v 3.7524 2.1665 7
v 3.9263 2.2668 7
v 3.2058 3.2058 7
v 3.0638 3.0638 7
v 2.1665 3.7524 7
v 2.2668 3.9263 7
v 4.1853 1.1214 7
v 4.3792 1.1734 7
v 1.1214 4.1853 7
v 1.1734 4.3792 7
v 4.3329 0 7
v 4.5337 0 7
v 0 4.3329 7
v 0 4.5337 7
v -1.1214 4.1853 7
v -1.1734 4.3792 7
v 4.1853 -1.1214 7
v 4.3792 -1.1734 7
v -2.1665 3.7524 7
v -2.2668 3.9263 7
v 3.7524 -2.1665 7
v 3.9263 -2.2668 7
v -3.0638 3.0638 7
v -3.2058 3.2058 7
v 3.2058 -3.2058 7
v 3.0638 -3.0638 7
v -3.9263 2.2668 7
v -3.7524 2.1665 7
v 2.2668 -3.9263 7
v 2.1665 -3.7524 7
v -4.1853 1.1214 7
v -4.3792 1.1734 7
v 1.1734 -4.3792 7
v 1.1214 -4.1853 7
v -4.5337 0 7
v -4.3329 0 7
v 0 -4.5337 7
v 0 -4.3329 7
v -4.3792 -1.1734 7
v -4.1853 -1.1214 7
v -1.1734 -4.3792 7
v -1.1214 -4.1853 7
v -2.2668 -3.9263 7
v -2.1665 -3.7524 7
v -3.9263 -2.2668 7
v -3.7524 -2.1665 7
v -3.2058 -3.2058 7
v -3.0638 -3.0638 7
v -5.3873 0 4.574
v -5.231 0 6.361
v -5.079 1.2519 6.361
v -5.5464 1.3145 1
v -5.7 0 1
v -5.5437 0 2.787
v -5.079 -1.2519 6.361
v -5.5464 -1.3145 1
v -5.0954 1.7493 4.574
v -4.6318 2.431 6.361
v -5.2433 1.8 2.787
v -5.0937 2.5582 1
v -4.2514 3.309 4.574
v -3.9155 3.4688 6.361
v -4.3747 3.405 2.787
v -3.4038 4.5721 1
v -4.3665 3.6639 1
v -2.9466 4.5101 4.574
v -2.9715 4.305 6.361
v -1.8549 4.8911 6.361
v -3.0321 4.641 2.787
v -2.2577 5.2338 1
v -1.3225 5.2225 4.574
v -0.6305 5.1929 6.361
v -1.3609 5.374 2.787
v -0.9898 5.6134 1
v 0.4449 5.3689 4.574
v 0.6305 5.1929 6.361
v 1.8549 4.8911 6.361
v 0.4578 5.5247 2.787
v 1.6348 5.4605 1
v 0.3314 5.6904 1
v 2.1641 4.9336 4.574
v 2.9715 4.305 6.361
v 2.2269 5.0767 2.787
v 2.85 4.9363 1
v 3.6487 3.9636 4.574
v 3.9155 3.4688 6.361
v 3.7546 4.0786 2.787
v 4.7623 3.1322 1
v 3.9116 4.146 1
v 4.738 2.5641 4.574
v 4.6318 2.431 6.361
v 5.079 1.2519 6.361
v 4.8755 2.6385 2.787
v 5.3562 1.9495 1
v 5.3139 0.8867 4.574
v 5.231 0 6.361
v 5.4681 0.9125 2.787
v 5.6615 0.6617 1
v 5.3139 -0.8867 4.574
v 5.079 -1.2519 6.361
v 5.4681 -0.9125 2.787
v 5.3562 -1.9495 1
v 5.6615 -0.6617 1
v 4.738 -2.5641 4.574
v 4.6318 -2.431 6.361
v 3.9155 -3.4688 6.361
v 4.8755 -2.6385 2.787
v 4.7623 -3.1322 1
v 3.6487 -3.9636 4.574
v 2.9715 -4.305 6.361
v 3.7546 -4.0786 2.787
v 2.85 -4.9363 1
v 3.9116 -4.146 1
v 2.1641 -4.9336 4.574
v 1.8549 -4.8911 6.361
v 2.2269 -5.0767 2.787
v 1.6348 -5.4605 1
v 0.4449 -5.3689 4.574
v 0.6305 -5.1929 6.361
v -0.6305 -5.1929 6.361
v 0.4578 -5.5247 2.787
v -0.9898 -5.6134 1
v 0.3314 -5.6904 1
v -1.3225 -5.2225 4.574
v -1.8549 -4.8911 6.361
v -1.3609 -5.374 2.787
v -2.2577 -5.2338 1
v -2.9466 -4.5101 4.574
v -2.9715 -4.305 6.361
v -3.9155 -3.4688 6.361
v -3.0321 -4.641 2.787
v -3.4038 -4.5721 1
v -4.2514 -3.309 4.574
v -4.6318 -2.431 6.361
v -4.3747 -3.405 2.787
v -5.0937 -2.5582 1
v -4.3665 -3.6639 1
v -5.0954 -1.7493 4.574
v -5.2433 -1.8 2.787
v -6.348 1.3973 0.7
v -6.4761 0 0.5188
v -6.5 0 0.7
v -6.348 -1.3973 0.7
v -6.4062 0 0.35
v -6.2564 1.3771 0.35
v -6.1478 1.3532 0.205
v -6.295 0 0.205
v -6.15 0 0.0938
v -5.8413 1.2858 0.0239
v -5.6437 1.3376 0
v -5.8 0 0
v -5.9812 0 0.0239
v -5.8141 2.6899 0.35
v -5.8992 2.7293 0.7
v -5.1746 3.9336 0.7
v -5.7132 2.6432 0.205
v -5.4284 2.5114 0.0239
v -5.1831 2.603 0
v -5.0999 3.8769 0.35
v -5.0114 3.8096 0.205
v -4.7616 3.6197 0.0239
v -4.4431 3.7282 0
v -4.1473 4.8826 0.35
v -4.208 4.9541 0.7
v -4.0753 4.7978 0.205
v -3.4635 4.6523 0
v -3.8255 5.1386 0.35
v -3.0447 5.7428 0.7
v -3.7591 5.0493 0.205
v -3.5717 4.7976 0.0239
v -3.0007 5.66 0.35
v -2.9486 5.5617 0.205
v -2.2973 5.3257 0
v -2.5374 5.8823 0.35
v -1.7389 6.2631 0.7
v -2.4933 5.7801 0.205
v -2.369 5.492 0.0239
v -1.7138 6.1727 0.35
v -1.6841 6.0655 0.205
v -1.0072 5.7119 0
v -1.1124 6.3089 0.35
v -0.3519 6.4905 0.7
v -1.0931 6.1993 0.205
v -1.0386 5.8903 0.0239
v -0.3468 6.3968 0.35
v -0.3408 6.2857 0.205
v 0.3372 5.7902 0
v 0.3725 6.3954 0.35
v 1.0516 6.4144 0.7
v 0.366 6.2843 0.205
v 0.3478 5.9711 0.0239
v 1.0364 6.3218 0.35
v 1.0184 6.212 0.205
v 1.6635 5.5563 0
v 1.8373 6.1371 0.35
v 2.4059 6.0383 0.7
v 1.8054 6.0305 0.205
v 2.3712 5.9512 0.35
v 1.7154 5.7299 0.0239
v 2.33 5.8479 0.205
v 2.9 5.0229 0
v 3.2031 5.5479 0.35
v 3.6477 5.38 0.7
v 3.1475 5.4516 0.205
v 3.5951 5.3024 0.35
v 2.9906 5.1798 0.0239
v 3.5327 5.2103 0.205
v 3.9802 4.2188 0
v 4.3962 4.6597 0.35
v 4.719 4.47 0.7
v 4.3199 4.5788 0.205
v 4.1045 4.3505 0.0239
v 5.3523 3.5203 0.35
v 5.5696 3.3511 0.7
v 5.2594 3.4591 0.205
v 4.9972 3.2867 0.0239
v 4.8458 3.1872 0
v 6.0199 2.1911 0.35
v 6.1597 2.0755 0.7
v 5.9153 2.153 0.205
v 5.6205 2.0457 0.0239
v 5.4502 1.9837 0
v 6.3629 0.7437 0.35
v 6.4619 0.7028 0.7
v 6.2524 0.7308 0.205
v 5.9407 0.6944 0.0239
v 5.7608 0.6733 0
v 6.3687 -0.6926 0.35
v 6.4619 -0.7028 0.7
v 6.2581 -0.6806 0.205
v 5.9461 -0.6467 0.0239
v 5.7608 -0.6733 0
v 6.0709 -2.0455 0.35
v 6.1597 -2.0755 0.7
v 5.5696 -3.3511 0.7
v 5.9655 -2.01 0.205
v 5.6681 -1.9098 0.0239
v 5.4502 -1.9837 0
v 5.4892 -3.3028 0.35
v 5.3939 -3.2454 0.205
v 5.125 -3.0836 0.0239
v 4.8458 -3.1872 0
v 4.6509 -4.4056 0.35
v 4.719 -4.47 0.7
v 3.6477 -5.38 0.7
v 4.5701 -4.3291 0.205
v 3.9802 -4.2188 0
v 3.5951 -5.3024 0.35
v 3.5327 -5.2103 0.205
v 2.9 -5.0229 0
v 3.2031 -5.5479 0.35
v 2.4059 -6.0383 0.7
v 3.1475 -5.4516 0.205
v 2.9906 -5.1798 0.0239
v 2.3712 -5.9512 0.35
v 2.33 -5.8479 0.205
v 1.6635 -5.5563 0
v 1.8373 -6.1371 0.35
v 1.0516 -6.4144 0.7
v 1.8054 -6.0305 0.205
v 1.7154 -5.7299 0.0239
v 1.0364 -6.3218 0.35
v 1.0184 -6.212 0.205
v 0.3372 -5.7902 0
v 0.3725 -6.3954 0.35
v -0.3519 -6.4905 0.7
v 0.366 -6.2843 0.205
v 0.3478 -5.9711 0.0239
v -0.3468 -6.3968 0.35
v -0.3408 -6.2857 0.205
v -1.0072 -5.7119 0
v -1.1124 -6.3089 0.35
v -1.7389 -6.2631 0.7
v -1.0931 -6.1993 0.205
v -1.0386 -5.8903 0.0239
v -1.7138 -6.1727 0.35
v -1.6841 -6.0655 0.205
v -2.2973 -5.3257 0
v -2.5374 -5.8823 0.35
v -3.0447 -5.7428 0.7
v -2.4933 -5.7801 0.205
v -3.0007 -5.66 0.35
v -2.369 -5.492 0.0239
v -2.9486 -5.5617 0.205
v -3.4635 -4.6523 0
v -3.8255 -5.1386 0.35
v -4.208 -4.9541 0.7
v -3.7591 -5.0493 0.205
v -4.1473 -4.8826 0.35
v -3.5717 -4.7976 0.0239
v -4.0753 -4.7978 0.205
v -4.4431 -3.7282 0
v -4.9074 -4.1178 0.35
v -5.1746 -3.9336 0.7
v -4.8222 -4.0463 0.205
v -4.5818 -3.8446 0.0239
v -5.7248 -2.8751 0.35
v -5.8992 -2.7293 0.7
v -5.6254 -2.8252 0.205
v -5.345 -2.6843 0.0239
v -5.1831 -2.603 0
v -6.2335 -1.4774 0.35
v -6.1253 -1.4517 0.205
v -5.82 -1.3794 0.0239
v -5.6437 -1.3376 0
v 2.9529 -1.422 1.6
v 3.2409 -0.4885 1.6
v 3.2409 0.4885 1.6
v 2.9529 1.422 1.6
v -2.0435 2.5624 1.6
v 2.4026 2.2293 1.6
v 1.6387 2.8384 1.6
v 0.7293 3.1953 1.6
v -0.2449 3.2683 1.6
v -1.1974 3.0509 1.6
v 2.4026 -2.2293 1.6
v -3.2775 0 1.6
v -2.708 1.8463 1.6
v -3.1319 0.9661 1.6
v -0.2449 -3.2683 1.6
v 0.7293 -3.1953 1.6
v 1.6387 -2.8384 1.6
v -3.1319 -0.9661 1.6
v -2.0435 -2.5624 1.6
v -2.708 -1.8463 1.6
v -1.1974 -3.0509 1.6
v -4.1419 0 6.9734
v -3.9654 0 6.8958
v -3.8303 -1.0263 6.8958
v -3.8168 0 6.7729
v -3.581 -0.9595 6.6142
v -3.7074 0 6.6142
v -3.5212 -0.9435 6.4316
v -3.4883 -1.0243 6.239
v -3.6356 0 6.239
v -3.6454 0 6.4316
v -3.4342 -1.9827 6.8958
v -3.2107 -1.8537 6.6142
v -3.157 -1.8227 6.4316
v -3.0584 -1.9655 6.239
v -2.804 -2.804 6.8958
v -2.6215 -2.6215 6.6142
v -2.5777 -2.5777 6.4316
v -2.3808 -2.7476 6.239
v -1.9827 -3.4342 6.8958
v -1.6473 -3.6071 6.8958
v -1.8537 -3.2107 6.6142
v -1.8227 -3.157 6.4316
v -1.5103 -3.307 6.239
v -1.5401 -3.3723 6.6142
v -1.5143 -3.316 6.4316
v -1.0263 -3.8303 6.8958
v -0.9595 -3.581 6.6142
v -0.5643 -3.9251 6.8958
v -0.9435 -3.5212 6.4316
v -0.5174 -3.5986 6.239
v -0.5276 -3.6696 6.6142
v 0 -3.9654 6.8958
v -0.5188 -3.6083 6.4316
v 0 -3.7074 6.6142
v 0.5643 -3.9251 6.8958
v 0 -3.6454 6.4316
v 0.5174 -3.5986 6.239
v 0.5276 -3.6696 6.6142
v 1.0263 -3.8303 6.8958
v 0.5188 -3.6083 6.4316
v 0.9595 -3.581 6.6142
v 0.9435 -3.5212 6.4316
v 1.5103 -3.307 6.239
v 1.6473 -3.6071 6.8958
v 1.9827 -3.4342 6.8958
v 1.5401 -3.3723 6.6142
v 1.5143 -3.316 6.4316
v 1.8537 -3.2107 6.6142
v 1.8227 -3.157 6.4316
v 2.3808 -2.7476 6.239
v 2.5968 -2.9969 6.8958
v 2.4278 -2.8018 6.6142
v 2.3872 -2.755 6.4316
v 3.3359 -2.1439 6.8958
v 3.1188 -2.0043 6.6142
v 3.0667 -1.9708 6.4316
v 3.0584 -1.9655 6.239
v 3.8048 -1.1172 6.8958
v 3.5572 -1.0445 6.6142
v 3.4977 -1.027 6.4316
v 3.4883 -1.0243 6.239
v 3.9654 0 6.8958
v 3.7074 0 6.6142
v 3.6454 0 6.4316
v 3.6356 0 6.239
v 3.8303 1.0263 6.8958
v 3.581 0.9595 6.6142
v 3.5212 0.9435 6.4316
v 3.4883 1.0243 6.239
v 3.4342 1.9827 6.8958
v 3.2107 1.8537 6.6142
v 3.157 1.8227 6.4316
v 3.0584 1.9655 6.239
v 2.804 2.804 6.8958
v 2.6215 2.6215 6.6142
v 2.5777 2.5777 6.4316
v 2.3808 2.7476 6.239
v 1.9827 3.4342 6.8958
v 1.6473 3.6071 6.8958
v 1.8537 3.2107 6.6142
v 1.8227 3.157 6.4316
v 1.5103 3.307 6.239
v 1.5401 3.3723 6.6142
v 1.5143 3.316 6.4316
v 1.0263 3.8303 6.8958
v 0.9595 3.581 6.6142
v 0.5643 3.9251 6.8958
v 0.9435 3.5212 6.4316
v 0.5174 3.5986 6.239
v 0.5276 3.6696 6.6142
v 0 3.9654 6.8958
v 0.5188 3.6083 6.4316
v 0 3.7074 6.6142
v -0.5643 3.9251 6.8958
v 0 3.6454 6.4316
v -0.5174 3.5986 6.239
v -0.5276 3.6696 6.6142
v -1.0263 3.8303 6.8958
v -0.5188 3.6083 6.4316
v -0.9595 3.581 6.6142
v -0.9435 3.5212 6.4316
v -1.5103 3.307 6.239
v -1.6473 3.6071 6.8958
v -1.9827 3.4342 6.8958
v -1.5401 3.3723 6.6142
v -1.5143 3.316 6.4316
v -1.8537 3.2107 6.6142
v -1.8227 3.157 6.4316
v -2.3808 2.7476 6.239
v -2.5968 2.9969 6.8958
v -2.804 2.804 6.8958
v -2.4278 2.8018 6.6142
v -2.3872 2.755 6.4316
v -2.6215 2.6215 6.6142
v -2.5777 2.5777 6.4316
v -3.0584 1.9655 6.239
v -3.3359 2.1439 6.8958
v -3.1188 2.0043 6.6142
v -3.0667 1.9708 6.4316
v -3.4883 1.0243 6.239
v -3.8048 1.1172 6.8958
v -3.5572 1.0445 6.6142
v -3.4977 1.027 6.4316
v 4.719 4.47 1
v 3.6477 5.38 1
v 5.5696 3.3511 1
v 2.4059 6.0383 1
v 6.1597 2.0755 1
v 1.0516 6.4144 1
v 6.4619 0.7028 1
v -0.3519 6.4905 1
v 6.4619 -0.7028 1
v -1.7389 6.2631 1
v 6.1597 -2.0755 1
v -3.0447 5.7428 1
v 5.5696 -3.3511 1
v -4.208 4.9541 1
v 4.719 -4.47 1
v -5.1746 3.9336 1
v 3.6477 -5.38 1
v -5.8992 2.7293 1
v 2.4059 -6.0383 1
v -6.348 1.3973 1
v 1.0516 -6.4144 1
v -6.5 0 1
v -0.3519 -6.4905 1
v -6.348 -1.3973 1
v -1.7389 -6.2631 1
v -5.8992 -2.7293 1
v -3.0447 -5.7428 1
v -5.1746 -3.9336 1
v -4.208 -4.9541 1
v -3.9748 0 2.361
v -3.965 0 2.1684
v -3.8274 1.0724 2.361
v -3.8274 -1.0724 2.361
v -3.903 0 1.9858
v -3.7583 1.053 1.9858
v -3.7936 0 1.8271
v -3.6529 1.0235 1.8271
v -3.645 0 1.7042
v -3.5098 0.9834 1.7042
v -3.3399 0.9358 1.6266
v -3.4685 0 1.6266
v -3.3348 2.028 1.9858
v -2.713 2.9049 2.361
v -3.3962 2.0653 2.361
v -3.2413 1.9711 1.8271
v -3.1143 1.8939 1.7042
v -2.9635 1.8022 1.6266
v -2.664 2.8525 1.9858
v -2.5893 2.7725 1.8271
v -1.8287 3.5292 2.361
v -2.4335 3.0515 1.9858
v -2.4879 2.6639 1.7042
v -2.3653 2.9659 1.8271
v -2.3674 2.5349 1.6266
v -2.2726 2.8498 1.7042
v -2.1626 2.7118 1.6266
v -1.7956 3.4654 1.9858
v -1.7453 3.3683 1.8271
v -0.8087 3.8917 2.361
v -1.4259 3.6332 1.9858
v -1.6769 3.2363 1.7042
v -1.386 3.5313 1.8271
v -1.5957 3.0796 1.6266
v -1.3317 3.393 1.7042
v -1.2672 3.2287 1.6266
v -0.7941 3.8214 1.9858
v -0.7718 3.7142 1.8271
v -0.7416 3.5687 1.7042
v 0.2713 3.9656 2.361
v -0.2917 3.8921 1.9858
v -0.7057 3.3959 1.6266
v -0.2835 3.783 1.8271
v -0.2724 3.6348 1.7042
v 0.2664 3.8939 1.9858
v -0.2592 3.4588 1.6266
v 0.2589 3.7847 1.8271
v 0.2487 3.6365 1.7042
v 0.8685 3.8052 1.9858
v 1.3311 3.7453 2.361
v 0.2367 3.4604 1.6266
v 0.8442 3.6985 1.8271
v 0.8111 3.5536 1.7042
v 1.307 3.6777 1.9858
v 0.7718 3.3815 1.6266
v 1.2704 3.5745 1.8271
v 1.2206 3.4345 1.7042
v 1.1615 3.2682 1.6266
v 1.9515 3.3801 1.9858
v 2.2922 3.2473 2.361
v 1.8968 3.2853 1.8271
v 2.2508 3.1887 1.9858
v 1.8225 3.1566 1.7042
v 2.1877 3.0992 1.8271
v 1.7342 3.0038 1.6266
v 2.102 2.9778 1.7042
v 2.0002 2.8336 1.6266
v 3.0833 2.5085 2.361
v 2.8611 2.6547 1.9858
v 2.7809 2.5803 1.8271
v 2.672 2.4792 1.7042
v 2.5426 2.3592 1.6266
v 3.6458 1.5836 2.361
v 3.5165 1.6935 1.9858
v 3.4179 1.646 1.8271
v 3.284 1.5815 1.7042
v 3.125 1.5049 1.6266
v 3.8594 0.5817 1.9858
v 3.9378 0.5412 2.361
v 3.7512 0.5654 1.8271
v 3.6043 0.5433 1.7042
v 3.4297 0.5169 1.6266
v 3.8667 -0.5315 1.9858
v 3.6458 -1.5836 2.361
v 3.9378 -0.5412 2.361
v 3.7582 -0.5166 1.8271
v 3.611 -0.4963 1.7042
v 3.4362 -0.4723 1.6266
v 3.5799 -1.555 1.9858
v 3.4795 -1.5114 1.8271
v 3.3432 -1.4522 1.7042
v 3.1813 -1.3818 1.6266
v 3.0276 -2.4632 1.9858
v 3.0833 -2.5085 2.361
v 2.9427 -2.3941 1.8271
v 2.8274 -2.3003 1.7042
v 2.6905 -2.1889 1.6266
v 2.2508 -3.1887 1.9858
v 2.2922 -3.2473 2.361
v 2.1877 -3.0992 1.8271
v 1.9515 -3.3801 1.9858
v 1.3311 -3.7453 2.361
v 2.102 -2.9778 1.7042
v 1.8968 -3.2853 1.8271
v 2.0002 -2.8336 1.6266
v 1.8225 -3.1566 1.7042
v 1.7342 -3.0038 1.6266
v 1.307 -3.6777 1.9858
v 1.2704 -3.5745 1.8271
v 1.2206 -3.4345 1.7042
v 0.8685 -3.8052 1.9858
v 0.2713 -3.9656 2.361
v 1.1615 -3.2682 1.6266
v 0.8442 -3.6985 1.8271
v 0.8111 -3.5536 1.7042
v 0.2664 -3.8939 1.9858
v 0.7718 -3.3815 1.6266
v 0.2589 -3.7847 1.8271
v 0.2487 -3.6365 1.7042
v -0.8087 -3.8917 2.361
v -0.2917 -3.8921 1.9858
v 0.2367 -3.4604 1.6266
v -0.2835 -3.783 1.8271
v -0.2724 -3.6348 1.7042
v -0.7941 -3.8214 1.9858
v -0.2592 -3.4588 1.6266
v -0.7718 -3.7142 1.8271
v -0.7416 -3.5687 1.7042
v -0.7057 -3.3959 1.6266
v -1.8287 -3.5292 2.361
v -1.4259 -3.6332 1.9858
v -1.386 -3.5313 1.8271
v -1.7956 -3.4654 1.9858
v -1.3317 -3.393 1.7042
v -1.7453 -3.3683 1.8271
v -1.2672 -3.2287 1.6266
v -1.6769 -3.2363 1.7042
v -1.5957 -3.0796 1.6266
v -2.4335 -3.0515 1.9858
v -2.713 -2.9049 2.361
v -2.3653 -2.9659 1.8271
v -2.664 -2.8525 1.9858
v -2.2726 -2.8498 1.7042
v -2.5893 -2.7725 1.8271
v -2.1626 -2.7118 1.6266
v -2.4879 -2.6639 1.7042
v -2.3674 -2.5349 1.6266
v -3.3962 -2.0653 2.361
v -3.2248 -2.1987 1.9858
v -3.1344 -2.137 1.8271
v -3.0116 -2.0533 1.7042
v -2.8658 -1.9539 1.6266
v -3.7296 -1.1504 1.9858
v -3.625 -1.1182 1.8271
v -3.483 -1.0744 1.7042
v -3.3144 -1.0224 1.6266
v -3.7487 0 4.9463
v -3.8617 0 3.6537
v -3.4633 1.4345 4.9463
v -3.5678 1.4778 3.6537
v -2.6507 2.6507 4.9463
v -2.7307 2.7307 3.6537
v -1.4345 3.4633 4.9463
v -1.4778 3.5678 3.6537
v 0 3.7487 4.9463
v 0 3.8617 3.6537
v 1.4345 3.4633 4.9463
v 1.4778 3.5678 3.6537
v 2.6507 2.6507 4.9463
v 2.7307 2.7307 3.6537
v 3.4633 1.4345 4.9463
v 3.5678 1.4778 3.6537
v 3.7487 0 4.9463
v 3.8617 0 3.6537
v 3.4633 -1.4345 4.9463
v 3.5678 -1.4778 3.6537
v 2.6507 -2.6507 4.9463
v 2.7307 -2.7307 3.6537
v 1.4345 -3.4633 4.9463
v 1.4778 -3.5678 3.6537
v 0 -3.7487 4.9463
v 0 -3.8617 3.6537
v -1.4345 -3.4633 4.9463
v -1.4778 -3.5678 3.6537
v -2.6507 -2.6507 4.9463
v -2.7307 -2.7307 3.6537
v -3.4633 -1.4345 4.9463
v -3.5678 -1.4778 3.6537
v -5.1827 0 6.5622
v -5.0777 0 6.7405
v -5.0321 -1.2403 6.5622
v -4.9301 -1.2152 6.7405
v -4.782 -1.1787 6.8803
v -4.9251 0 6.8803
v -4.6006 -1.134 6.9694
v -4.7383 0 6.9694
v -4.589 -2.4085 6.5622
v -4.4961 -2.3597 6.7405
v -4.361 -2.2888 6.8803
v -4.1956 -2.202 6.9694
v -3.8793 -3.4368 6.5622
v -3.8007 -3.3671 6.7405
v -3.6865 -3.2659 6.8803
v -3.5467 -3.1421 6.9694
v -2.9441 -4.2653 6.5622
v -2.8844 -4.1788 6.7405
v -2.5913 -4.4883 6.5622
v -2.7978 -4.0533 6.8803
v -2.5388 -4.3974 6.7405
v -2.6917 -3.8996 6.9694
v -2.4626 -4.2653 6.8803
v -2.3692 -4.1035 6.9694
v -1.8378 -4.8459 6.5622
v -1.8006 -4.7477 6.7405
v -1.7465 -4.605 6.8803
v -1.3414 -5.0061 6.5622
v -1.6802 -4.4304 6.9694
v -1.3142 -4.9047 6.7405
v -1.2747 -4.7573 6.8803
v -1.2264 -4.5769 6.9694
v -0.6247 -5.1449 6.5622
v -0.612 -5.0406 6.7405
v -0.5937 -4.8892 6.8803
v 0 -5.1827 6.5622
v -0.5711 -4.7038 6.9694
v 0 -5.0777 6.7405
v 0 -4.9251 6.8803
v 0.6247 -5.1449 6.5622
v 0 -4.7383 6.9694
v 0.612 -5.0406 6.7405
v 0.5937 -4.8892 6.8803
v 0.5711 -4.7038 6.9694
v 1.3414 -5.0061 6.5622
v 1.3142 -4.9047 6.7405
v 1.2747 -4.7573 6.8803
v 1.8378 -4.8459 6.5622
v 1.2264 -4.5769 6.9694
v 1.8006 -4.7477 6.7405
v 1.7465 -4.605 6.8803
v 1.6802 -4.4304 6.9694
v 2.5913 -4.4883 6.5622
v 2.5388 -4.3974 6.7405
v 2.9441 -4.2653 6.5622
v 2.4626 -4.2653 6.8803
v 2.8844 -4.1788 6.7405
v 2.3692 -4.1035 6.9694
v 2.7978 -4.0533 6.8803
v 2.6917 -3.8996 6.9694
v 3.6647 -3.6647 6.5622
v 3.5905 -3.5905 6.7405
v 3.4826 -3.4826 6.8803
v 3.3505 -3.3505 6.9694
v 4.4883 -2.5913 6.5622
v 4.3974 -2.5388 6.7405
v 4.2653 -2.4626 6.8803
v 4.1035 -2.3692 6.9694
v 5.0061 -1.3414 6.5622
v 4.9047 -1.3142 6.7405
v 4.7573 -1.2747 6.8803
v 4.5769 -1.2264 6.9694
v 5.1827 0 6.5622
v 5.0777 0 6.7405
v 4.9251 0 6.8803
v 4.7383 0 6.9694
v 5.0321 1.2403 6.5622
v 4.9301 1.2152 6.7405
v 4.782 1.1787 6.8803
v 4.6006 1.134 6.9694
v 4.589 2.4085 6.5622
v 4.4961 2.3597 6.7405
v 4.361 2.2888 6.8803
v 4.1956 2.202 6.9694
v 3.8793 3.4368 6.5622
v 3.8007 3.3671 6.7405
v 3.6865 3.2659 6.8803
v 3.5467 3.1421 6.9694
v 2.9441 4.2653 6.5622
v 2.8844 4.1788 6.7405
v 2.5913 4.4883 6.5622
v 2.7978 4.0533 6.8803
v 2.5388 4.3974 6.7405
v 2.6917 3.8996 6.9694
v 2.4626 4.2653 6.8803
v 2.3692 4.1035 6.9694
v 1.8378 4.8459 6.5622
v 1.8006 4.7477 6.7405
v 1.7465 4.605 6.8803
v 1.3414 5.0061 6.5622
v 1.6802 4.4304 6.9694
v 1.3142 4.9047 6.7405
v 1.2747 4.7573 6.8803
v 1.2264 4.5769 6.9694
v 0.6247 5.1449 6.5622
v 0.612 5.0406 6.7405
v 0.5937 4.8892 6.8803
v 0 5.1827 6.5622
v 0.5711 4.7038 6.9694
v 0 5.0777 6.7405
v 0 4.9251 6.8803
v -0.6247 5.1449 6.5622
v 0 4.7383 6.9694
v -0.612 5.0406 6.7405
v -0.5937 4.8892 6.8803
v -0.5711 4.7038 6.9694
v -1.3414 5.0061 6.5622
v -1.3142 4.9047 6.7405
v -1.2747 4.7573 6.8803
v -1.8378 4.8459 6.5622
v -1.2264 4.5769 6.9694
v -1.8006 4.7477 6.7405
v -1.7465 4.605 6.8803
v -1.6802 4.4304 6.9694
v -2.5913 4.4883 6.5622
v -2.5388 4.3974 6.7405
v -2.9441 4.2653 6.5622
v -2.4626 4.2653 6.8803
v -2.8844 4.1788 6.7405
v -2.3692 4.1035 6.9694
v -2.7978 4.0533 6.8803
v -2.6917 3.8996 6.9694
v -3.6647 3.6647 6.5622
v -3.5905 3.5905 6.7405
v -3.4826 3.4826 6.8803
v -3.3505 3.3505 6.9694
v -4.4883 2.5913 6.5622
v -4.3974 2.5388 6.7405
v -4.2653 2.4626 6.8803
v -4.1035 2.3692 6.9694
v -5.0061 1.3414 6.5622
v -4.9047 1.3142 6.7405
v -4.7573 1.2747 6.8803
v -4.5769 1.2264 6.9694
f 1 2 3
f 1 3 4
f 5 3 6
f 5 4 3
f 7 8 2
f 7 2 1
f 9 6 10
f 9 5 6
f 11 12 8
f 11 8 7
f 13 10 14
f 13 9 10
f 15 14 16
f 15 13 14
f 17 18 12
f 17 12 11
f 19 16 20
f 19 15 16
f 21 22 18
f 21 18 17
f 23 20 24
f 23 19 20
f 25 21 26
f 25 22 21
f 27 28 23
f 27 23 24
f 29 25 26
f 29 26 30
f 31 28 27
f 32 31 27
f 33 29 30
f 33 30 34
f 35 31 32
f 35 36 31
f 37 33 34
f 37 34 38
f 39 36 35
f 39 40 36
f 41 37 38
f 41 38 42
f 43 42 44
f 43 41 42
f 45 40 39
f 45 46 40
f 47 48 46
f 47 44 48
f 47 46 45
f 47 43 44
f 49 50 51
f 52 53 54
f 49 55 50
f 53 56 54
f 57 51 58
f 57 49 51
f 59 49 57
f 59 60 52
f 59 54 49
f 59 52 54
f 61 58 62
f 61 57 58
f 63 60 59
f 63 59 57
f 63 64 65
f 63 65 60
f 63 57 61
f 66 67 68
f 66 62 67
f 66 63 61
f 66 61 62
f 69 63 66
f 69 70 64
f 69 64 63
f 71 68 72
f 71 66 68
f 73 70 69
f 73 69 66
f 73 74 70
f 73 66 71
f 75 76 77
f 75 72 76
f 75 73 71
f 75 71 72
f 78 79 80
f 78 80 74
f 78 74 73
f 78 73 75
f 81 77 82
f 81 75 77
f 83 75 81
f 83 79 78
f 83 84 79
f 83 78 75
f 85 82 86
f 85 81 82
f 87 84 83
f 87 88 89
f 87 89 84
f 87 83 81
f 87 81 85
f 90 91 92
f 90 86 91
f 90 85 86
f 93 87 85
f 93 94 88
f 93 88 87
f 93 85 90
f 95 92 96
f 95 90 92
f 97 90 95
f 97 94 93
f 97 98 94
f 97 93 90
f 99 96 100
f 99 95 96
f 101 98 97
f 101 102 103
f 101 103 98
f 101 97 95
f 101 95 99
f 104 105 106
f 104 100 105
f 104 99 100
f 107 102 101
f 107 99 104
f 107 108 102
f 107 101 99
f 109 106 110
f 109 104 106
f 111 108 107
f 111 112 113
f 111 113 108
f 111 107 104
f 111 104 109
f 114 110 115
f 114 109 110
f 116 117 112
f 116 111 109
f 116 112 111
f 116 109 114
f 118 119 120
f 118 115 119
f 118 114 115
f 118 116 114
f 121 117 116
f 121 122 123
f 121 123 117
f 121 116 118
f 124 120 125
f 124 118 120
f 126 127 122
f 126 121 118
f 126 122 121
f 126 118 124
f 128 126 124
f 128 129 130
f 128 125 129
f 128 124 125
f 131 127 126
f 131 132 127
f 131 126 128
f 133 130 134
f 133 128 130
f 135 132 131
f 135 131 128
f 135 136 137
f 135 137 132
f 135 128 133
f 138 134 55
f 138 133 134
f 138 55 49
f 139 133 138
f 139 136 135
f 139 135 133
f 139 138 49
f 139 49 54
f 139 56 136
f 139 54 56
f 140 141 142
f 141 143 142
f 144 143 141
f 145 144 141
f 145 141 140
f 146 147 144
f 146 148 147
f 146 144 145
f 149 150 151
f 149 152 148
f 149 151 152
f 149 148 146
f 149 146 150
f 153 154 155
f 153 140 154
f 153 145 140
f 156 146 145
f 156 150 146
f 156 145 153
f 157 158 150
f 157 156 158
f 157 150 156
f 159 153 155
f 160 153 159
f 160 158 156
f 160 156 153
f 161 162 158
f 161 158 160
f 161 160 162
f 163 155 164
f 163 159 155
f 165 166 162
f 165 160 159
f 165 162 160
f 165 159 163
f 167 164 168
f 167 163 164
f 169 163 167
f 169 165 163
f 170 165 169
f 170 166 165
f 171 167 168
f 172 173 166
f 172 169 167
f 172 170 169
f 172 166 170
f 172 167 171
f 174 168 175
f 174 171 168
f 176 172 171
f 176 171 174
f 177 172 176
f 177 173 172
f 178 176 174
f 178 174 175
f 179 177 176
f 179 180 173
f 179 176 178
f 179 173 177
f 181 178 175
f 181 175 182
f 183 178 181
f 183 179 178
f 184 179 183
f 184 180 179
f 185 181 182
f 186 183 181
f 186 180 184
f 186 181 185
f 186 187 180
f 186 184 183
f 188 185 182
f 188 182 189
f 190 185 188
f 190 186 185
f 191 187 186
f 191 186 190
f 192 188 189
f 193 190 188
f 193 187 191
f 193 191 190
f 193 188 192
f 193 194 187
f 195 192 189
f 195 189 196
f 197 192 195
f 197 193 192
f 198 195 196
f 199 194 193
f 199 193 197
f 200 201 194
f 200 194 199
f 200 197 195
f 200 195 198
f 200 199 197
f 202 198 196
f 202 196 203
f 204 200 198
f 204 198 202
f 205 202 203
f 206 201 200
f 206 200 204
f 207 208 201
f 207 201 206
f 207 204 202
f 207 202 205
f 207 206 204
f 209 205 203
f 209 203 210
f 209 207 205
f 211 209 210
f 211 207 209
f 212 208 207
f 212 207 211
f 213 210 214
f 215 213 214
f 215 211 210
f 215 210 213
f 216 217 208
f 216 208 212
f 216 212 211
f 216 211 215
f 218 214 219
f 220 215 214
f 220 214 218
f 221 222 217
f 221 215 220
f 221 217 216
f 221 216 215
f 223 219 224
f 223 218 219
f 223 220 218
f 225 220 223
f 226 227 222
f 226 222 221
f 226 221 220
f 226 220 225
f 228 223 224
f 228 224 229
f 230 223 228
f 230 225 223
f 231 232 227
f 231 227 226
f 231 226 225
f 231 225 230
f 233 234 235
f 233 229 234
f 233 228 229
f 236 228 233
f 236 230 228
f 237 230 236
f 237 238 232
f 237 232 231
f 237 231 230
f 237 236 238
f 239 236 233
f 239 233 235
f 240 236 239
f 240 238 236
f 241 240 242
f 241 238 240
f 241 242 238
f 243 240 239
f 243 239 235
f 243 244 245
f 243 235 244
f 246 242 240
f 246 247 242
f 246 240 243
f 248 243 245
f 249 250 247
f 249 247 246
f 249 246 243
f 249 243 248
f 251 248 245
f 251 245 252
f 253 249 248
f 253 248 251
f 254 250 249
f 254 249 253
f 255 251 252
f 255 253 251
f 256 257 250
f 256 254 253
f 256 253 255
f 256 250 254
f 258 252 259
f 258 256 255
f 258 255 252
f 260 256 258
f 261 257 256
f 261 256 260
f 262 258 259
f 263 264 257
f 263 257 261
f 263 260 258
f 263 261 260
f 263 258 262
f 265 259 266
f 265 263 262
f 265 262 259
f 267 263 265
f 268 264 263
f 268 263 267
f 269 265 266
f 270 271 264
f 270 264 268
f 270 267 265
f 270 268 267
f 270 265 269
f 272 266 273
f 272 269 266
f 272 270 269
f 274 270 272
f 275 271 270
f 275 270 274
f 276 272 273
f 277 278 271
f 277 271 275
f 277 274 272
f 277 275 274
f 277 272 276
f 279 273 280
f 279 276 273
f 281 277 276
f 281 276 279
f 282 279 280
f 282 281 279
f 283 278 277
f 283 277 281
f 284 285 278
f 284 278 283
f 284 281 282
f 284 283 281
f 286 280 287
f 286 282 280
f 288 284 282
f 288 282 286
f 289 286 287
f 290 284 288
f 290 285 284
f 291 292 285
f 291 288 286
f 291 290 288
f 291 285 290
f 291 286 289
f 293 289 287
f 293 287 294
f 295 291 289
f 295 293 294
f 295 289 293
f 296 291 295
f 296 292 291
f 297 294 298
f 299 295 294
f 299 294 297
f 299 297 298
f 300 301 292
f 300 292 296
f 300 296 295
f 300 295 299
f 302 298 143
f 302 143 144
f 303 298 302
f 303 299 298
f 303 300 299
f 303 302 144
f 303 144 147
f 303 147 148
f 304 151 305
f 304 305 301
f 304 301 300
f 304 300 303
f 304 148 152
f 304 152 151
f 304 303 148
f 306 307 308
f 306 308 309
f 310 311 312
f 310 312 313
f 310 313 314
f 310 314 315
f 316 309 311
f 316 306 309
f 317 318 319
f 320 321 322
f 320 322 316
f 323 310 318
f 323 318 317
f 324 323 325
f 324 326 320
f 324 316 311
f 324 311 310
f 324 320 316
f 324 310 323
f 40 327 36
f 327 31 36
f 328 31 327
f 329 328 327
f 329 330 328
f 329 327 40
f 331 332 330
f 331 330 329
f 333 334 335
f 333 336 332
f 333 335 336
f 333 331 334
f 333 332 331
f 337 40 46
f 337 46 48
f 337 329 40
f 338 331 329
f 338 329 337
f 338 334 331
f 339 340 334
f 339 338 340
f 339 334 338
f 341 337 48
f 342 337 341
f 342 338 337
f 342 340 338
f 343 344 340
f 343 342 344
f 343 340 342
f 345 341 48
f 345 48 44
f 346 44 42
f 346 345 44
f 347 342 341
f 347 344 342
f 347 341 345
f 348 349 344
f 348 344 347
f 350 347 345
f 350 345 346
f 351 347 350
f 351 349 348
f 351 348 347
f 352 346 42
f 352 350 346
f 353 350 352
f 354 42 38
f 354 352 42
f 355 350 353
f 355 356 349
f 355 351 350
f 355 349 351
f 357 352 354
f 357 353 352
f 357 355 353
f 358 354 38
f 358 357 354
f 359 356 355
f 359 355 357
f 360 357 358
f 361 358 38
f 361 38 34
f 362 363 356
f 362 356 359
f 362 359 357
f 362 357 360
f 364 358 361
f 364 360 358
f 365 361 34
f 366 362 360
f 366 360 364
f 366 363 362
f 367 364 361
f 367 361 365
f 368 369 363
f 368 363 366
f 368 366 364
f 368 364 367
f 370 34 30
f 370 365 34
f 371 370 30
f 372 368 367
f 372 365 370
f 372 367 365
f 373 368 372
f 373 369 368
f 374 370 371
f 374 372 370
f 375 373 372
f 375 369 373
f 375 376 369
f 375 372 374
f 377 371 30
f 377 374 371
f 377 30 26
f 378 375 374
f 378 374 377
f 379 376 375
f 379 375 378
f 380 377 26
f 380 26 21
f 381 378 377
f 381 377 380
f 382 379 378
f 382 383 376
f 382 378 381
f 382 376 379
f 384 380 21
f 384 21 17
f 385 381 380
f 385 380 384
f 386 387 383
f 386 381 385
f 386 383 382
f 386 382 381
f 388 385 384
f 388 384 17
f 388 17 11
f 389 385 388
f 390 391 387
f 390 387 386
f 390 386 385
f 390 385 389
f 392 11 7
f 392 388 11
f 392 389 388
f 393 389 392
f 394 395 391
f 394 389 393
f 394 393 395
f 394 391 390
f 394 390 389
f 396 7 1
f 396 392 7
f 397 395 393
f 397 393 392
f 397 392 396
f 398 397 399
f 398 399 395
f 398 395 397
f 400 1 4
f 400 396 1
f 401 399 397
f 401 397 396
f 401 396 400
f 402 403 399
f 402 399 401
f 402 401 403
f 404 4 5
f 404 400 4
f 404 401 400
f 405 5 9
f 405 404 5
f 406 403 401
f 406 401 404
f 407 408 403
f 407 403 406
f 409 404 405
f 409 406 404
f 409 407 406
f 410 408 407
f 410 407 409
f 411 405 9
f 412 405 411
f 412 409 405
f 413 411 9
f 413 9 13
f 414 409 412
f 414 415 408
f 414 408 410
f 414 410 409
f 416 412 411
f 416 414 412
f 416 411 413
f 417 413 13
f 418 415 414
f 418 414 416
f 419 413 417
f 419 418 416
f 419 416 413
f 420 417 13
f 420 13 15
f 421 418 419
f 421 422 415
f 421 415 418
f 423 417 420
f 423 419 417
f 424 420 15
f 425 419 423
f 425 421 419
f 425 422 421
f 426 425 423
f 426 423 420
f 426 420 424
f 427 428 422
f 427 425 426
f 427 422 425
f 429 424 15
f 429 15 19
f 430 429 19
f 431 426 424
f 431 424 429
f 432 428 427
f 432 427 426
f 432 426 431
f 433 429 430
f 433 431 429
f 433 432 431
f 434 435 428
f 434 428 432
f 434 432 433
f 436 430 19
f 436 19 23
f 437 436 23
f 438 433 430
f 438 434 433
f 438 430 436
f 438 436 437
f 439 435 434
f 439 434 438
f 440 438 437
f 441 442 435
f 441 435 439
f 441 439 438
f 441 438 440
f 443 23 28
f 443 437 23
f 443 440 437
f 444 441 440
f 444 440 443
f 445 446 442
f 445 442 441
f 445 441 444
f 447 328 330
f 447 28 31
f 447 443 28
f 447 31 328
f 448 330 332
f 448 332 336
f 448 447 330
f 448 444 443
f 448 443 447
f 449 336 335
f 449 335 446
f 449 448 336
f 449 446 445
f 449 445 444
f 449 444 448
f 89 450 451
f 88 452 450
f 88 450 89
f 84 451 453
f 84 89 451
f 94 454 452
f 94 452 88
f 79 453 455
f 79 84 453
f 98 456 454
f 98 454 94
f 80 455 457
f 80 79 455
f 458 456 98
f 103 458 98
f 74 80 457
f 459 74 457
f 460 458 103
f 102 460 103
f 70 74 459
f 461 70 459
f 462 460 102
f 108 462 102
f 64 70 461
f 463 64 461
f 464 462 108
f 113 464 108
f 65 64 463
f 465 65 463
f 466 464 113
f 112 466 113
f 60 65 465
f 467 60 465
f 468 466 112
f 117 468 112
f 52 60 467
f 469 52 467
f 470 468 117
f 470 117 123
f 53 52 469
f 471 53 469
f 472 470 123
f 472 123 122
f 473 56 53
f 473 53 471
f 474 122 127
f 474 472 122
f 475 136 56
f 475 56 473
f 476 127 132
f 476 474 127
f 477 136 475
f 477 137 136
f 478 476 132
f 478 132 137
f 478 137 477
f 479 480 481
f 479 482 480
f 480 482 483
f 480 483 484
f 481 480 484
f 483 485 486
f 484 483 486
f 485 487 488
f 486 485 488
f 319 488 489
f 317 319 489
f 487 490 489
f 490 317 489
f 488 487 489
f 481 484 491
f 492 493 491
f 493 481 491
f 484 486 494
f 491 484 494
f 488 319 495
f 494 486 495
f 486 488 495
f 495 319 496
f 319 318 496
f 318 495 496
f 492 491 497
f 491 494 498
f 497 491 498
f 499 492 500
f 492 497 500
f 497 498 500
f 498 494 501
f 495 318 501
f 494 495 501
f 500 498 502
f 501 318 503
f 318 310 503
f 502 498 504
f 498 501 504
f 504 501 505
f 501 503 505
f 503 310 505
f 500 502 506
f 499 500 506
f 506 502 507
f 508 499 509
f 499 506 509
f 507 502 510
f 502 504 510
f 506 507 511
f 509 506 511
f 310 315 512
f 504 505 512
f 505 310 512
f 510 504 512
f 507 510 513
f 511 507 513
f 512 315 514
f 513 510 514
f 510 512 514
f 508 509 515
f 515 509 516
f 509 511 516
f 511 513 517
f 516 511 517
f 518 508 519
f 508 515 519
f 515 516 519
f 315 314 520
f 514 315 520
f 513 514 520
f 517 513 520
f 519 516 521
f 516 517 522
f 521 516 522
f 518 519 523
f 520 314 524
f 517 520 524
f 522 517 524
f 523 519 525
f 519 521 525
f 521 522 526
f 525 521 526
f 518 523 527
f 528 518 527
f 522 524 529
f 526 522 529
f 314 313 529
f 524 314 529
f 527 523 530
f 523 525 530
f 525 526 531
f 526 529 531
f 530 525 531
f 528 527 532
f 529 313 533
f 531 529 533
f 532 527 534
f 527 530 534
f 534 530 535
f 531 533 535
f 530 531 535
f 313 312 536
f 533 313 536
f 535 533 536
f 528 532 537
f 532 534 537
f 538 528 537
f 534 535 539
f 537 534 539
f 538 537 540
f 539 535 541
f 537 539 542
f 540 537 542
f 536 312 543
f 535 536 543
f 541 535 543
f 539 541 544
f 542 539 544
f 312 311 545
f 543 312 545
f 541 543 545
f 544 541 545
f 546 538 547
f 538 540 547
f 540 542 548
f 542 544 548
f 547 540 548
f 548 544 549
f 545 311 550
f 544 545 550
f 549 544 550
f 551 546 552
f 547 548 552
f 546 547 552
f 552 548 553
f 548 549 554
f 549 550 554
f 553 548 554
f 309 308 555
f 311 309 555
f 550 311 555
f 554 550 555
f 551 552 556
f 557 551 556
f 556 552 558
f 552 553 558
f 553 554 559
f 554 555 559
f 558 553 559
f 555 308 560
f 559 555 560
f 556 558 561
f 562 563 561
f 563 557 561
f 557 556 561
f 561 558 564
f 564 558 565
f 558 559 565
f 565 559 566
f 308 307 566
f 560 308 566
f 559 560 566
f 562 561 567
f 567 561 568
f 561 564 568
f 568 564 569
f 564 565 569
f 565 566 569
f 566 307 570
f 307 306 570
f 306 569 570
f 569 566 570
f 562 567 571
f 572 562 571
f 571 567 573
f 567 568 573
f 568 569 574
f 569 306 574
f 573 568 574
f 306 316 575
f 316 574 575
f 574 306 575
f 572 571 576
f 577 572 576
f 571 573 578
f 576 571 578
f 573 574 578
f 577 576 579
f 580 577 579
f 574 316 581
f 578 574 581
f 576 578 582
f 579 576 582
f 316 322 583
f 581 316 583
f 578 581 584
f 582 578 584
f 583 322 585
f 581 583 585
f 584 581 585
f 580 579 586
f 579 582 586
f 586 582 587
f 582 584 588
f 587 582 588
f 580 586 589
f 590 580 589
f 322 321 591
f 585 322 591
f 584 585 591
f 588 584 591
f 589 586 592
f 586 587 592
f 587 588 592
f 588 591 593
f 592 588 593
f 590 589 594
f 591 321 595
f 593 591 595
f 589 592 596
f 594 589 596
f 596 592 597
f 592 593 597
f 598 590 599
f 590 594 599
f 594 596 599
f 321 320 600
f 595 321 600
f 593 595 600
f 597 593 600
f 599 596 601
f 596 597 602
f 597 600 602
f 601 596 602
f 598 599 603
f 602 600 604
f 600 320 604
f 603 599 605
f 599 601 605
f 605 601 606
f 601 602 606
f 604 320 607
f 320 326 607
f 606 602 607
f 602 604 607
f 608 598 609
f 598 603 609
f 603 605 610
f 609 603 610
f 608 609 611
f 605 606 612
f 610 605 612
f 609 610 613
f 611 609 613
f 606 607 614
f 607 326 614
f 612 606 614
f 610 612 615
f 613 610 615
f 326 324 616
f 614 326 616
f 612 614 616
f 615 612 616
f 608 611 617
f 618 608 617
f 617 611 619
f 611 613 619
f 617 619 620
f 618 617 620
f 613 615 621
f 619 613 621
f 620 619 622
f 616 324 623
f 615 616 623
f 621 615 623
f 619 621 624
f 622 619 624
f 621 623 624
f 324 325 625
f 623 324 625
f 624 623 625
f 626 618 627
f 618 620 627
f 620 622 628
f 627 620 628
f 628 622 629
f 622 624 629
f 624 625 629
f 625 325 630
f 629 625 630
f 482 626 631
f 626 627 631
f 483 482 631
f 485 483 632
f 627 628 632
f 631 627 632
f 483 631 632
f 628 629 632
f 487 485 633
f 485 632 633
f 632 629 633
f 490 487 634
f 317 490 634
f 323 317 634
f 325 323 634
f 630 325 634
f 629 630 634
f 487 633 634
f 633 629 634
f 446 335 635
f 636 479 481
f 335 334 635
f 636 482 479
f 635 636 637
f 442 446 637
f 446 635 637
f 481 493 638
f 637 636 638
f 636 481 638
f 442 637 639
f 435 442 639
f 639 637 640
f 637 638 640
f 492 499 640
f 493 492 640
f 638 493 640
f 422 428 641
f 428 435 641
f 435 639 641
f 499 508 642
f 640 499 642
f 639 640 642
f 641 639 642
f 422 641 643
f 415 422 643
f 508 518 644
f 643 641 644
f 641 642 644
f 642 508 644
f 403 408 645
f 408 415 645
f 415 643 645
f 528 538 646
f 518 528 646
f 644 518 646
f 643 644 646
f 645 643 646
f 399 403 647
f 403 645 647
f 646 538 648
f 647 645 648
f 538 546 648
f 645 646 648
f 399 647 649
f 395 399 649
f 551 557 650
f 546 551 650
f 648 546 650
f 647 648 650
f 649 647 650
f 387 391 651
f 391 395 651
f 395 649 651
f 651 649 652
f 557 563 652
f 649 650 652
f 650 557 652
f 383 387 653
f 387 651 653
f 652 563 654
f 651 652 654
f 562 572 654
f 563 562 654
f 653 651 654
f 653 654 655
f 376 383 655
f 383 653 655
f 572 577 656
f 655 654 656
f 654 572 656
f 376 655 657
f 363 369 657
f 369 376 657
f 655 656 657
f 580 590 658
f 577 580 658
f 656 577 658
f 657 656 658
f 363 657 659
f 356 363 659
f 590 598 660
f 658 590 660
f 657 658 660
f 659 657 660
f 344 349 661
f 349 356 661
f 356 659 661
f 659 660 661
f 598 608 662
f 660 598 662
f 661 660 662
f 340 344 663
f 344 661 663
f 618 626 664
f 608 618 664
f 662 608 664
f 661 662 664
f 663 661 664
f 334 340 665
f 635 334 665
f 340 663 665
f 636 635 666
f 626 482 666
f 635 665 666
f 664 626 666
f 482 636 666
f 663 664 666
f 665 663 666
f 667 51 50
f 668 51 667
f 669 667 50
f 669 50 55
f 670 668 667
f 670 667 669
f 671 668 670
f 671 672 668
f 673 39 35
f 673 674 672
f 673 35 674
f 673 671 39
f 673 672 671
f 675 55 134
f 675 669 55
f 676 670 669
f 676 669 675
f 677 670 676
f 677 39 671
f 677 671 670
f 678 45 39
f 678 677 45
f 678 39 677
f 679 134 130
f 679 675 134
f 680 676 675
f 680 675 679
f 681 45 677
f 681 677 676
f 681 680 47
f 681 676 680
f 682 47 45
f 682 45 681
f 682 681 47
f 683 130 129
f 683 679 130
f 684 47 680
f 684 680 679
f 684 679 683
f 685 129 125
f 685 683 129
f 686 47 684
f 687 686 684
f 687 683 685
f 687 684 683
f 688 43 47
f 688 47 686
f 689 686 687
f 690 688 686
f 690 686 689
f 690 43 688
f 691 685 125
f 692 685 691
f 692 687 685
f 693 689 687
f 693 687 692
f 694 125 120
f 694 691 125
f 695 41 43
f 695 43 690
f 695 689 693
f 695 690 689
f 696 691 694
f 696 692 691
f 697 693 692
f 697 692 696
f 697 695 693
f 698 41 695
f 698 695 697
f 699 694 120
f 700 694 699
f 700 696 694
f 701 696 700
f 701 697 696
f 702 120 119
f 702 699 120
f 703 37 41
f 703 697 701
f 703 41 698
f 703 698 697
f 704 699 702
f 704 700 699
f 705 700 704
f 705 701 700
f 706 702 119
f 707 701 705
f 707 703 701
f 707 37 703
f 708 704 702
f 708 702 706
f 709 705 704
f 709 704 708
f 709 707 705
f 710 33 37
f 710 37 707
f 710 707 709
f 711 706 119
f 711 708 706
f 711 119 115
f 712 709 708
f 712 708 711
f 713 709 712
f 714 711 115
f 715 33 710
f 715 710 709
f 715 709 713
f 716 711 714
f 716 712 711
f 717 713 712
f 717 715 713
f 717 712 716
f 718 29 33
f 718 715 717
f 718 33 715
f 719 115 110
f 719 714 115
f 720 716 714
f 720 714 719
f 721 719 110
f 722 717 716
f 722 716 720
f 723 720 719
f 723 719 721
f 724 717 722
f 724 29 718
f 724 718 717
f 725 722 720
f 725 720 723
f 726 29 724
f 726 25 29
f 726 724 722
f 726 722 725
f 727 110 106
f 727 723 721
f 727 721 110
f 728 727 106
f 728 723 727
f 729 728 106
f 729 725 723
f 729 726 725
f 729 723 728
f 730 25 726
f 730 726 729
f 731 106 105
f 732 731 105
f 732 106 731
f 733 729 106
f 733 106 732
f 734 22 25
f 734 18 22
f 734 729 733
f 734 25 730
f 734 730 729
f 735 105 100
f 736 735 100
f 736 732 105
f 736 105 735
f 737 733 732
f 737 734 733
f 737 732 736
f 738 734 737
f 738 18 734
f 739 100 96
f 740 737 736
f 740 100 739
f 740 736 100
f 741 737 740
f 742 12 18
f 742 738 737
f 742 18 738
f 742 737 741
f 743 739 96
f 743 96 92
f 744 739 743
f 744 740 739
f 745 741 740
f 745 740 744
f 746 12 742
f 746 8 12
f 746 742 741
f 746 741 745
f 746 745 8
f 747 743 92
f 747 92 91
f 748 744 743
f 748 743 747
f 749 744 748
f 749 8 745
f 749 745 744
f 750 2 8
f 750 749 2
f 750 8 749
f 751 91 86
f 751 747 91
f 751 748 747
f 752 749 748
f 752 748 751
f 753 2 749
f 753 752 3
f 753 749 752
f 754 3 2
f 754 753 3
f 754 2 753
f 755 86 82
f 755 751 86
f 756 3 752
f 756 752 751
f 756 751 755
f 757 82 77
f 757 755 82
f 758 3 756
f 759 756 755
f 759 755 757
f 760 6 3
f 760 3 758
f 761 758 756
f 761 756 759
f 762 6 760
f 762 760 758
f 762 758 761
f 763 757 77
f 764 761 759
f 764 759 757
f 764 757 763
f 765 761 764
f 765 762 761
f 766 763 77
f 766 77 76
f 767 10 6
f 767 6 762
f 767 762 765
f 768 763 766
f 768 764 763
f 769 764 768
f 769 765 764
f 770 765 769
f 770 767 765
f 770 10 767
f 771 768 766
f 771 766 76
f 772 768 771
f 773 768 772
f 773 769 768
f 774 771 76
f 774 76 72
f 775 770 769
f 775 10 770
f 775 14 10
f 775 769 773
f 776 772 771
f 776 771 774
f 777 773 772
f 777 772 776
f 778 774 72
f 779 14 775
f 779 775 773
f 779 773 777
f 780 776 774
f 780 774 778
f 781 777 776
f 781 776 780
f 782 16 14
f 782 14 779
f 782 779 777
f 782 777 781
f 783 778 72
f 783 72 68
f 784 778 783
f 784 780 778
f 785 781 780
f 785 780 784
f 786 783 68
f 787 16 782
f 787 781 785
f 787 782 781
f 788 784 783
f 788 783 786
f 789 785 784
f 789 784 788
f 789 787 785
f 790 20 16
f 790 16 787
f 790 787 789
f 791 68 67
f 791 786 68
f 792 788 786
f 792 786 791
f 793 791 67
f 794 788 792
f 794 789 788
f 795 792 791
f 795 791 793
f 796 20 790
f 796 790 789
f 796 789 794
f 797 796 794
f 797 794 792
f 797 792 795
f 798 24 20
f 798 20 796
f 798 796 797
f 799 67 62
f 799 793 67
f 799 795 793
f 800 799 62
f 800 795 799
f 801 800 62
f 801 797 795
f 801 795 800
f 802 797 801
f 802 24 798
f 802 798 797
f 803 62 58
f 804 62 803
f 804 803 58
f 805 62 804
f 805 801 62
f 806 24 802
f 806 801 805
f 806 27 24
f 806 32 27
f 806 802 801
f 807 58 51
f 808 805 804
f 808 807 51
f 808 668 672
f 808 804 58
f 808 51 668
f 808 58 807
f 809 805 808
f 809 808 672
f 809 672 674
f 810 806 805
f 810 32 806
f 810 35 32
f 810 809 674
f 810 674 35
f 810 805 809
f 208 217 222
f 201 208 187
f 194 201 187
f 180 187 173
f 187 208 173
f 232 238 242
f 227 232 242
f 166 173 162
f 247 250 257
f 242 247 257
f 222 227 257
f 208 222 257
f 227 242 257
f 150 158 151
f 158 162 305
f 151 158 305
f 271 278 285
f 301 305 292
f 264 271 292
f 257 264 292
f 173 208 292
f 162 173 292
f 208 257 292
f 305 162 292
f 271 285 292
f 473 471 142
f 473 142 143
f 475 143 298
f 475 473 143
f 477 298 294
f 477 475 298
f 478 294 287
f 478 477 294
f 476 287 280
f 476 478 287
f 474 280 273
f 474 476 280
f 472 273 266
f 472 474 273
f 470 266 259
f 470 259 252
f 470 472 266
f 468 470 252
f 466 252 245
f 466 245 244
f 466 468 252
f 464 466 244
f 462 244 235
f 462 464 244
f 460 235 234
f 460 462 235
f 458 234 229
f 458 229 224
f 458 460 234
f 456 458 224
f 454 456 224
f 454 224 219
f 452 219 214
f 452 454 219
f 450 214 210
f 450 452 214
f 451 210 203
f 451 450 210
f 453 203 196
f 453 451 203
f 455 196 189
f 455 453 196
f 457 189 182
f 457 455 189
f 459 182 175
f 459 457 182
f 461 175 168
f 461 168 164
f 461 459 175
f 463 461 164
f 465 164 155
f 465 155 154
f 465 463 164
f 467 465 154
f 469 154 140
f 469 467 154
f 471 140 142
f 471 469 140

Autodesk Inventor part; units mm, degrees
ref_plane "YZ Plane" through (0, 0, 0) normal (1, 0, 0) x (0, 1, 0)
ref_plane "XZ Plane" through (0, 0, 0) normal (0, 1, 0) x (-1, 0, 0)
ref_plane "XY Plane" through (0, 0, 0) normal (0, 0, 1) x (1, 0, 0)
sketch "Skizze1" plane through (0, 0, 0) normal (0, 1, 0) x (-1, 0, 0)
  line L0 (0, 0) -> (6.5, 0)
  line L1 (6.5, 0) -> (6.5, 1)
  line L2 (6.5, 1) -> (5.7, 1)
  line L3 (5.7, 1) -> (5.1751, 7)
  line L4 (5.1751, 7) -> (0, 7)
  line L5 (0, 7) -> (0, 0)
  line L6 (0, -2.278) -> (0, 8.6565) construction
  dimension "d0" = 6.5
  dimension "d1" = 1
  dimension "d2" = 7
  dimension "d3" = 95
  dimension "d4" = 5.7
revolve "Umdrehung1" add sketch "Skizze1" angle 360 about axis through (0, 0, -2.278) along (0, 0, 1)
fillet "Rundung1" radius 0.7 1 edges at (6.5, 0, 0)
shell "Wandung1" thickness 1.6 removed faces 1 at (1.38, 0.4128, 7)
fillet "Rundung2" radius 0.7 3 edges at (5.1751, 0, 7) (3.569, 0, 7) (4.0414, 0, 1.6)
properties part number "FED ttl plug"
